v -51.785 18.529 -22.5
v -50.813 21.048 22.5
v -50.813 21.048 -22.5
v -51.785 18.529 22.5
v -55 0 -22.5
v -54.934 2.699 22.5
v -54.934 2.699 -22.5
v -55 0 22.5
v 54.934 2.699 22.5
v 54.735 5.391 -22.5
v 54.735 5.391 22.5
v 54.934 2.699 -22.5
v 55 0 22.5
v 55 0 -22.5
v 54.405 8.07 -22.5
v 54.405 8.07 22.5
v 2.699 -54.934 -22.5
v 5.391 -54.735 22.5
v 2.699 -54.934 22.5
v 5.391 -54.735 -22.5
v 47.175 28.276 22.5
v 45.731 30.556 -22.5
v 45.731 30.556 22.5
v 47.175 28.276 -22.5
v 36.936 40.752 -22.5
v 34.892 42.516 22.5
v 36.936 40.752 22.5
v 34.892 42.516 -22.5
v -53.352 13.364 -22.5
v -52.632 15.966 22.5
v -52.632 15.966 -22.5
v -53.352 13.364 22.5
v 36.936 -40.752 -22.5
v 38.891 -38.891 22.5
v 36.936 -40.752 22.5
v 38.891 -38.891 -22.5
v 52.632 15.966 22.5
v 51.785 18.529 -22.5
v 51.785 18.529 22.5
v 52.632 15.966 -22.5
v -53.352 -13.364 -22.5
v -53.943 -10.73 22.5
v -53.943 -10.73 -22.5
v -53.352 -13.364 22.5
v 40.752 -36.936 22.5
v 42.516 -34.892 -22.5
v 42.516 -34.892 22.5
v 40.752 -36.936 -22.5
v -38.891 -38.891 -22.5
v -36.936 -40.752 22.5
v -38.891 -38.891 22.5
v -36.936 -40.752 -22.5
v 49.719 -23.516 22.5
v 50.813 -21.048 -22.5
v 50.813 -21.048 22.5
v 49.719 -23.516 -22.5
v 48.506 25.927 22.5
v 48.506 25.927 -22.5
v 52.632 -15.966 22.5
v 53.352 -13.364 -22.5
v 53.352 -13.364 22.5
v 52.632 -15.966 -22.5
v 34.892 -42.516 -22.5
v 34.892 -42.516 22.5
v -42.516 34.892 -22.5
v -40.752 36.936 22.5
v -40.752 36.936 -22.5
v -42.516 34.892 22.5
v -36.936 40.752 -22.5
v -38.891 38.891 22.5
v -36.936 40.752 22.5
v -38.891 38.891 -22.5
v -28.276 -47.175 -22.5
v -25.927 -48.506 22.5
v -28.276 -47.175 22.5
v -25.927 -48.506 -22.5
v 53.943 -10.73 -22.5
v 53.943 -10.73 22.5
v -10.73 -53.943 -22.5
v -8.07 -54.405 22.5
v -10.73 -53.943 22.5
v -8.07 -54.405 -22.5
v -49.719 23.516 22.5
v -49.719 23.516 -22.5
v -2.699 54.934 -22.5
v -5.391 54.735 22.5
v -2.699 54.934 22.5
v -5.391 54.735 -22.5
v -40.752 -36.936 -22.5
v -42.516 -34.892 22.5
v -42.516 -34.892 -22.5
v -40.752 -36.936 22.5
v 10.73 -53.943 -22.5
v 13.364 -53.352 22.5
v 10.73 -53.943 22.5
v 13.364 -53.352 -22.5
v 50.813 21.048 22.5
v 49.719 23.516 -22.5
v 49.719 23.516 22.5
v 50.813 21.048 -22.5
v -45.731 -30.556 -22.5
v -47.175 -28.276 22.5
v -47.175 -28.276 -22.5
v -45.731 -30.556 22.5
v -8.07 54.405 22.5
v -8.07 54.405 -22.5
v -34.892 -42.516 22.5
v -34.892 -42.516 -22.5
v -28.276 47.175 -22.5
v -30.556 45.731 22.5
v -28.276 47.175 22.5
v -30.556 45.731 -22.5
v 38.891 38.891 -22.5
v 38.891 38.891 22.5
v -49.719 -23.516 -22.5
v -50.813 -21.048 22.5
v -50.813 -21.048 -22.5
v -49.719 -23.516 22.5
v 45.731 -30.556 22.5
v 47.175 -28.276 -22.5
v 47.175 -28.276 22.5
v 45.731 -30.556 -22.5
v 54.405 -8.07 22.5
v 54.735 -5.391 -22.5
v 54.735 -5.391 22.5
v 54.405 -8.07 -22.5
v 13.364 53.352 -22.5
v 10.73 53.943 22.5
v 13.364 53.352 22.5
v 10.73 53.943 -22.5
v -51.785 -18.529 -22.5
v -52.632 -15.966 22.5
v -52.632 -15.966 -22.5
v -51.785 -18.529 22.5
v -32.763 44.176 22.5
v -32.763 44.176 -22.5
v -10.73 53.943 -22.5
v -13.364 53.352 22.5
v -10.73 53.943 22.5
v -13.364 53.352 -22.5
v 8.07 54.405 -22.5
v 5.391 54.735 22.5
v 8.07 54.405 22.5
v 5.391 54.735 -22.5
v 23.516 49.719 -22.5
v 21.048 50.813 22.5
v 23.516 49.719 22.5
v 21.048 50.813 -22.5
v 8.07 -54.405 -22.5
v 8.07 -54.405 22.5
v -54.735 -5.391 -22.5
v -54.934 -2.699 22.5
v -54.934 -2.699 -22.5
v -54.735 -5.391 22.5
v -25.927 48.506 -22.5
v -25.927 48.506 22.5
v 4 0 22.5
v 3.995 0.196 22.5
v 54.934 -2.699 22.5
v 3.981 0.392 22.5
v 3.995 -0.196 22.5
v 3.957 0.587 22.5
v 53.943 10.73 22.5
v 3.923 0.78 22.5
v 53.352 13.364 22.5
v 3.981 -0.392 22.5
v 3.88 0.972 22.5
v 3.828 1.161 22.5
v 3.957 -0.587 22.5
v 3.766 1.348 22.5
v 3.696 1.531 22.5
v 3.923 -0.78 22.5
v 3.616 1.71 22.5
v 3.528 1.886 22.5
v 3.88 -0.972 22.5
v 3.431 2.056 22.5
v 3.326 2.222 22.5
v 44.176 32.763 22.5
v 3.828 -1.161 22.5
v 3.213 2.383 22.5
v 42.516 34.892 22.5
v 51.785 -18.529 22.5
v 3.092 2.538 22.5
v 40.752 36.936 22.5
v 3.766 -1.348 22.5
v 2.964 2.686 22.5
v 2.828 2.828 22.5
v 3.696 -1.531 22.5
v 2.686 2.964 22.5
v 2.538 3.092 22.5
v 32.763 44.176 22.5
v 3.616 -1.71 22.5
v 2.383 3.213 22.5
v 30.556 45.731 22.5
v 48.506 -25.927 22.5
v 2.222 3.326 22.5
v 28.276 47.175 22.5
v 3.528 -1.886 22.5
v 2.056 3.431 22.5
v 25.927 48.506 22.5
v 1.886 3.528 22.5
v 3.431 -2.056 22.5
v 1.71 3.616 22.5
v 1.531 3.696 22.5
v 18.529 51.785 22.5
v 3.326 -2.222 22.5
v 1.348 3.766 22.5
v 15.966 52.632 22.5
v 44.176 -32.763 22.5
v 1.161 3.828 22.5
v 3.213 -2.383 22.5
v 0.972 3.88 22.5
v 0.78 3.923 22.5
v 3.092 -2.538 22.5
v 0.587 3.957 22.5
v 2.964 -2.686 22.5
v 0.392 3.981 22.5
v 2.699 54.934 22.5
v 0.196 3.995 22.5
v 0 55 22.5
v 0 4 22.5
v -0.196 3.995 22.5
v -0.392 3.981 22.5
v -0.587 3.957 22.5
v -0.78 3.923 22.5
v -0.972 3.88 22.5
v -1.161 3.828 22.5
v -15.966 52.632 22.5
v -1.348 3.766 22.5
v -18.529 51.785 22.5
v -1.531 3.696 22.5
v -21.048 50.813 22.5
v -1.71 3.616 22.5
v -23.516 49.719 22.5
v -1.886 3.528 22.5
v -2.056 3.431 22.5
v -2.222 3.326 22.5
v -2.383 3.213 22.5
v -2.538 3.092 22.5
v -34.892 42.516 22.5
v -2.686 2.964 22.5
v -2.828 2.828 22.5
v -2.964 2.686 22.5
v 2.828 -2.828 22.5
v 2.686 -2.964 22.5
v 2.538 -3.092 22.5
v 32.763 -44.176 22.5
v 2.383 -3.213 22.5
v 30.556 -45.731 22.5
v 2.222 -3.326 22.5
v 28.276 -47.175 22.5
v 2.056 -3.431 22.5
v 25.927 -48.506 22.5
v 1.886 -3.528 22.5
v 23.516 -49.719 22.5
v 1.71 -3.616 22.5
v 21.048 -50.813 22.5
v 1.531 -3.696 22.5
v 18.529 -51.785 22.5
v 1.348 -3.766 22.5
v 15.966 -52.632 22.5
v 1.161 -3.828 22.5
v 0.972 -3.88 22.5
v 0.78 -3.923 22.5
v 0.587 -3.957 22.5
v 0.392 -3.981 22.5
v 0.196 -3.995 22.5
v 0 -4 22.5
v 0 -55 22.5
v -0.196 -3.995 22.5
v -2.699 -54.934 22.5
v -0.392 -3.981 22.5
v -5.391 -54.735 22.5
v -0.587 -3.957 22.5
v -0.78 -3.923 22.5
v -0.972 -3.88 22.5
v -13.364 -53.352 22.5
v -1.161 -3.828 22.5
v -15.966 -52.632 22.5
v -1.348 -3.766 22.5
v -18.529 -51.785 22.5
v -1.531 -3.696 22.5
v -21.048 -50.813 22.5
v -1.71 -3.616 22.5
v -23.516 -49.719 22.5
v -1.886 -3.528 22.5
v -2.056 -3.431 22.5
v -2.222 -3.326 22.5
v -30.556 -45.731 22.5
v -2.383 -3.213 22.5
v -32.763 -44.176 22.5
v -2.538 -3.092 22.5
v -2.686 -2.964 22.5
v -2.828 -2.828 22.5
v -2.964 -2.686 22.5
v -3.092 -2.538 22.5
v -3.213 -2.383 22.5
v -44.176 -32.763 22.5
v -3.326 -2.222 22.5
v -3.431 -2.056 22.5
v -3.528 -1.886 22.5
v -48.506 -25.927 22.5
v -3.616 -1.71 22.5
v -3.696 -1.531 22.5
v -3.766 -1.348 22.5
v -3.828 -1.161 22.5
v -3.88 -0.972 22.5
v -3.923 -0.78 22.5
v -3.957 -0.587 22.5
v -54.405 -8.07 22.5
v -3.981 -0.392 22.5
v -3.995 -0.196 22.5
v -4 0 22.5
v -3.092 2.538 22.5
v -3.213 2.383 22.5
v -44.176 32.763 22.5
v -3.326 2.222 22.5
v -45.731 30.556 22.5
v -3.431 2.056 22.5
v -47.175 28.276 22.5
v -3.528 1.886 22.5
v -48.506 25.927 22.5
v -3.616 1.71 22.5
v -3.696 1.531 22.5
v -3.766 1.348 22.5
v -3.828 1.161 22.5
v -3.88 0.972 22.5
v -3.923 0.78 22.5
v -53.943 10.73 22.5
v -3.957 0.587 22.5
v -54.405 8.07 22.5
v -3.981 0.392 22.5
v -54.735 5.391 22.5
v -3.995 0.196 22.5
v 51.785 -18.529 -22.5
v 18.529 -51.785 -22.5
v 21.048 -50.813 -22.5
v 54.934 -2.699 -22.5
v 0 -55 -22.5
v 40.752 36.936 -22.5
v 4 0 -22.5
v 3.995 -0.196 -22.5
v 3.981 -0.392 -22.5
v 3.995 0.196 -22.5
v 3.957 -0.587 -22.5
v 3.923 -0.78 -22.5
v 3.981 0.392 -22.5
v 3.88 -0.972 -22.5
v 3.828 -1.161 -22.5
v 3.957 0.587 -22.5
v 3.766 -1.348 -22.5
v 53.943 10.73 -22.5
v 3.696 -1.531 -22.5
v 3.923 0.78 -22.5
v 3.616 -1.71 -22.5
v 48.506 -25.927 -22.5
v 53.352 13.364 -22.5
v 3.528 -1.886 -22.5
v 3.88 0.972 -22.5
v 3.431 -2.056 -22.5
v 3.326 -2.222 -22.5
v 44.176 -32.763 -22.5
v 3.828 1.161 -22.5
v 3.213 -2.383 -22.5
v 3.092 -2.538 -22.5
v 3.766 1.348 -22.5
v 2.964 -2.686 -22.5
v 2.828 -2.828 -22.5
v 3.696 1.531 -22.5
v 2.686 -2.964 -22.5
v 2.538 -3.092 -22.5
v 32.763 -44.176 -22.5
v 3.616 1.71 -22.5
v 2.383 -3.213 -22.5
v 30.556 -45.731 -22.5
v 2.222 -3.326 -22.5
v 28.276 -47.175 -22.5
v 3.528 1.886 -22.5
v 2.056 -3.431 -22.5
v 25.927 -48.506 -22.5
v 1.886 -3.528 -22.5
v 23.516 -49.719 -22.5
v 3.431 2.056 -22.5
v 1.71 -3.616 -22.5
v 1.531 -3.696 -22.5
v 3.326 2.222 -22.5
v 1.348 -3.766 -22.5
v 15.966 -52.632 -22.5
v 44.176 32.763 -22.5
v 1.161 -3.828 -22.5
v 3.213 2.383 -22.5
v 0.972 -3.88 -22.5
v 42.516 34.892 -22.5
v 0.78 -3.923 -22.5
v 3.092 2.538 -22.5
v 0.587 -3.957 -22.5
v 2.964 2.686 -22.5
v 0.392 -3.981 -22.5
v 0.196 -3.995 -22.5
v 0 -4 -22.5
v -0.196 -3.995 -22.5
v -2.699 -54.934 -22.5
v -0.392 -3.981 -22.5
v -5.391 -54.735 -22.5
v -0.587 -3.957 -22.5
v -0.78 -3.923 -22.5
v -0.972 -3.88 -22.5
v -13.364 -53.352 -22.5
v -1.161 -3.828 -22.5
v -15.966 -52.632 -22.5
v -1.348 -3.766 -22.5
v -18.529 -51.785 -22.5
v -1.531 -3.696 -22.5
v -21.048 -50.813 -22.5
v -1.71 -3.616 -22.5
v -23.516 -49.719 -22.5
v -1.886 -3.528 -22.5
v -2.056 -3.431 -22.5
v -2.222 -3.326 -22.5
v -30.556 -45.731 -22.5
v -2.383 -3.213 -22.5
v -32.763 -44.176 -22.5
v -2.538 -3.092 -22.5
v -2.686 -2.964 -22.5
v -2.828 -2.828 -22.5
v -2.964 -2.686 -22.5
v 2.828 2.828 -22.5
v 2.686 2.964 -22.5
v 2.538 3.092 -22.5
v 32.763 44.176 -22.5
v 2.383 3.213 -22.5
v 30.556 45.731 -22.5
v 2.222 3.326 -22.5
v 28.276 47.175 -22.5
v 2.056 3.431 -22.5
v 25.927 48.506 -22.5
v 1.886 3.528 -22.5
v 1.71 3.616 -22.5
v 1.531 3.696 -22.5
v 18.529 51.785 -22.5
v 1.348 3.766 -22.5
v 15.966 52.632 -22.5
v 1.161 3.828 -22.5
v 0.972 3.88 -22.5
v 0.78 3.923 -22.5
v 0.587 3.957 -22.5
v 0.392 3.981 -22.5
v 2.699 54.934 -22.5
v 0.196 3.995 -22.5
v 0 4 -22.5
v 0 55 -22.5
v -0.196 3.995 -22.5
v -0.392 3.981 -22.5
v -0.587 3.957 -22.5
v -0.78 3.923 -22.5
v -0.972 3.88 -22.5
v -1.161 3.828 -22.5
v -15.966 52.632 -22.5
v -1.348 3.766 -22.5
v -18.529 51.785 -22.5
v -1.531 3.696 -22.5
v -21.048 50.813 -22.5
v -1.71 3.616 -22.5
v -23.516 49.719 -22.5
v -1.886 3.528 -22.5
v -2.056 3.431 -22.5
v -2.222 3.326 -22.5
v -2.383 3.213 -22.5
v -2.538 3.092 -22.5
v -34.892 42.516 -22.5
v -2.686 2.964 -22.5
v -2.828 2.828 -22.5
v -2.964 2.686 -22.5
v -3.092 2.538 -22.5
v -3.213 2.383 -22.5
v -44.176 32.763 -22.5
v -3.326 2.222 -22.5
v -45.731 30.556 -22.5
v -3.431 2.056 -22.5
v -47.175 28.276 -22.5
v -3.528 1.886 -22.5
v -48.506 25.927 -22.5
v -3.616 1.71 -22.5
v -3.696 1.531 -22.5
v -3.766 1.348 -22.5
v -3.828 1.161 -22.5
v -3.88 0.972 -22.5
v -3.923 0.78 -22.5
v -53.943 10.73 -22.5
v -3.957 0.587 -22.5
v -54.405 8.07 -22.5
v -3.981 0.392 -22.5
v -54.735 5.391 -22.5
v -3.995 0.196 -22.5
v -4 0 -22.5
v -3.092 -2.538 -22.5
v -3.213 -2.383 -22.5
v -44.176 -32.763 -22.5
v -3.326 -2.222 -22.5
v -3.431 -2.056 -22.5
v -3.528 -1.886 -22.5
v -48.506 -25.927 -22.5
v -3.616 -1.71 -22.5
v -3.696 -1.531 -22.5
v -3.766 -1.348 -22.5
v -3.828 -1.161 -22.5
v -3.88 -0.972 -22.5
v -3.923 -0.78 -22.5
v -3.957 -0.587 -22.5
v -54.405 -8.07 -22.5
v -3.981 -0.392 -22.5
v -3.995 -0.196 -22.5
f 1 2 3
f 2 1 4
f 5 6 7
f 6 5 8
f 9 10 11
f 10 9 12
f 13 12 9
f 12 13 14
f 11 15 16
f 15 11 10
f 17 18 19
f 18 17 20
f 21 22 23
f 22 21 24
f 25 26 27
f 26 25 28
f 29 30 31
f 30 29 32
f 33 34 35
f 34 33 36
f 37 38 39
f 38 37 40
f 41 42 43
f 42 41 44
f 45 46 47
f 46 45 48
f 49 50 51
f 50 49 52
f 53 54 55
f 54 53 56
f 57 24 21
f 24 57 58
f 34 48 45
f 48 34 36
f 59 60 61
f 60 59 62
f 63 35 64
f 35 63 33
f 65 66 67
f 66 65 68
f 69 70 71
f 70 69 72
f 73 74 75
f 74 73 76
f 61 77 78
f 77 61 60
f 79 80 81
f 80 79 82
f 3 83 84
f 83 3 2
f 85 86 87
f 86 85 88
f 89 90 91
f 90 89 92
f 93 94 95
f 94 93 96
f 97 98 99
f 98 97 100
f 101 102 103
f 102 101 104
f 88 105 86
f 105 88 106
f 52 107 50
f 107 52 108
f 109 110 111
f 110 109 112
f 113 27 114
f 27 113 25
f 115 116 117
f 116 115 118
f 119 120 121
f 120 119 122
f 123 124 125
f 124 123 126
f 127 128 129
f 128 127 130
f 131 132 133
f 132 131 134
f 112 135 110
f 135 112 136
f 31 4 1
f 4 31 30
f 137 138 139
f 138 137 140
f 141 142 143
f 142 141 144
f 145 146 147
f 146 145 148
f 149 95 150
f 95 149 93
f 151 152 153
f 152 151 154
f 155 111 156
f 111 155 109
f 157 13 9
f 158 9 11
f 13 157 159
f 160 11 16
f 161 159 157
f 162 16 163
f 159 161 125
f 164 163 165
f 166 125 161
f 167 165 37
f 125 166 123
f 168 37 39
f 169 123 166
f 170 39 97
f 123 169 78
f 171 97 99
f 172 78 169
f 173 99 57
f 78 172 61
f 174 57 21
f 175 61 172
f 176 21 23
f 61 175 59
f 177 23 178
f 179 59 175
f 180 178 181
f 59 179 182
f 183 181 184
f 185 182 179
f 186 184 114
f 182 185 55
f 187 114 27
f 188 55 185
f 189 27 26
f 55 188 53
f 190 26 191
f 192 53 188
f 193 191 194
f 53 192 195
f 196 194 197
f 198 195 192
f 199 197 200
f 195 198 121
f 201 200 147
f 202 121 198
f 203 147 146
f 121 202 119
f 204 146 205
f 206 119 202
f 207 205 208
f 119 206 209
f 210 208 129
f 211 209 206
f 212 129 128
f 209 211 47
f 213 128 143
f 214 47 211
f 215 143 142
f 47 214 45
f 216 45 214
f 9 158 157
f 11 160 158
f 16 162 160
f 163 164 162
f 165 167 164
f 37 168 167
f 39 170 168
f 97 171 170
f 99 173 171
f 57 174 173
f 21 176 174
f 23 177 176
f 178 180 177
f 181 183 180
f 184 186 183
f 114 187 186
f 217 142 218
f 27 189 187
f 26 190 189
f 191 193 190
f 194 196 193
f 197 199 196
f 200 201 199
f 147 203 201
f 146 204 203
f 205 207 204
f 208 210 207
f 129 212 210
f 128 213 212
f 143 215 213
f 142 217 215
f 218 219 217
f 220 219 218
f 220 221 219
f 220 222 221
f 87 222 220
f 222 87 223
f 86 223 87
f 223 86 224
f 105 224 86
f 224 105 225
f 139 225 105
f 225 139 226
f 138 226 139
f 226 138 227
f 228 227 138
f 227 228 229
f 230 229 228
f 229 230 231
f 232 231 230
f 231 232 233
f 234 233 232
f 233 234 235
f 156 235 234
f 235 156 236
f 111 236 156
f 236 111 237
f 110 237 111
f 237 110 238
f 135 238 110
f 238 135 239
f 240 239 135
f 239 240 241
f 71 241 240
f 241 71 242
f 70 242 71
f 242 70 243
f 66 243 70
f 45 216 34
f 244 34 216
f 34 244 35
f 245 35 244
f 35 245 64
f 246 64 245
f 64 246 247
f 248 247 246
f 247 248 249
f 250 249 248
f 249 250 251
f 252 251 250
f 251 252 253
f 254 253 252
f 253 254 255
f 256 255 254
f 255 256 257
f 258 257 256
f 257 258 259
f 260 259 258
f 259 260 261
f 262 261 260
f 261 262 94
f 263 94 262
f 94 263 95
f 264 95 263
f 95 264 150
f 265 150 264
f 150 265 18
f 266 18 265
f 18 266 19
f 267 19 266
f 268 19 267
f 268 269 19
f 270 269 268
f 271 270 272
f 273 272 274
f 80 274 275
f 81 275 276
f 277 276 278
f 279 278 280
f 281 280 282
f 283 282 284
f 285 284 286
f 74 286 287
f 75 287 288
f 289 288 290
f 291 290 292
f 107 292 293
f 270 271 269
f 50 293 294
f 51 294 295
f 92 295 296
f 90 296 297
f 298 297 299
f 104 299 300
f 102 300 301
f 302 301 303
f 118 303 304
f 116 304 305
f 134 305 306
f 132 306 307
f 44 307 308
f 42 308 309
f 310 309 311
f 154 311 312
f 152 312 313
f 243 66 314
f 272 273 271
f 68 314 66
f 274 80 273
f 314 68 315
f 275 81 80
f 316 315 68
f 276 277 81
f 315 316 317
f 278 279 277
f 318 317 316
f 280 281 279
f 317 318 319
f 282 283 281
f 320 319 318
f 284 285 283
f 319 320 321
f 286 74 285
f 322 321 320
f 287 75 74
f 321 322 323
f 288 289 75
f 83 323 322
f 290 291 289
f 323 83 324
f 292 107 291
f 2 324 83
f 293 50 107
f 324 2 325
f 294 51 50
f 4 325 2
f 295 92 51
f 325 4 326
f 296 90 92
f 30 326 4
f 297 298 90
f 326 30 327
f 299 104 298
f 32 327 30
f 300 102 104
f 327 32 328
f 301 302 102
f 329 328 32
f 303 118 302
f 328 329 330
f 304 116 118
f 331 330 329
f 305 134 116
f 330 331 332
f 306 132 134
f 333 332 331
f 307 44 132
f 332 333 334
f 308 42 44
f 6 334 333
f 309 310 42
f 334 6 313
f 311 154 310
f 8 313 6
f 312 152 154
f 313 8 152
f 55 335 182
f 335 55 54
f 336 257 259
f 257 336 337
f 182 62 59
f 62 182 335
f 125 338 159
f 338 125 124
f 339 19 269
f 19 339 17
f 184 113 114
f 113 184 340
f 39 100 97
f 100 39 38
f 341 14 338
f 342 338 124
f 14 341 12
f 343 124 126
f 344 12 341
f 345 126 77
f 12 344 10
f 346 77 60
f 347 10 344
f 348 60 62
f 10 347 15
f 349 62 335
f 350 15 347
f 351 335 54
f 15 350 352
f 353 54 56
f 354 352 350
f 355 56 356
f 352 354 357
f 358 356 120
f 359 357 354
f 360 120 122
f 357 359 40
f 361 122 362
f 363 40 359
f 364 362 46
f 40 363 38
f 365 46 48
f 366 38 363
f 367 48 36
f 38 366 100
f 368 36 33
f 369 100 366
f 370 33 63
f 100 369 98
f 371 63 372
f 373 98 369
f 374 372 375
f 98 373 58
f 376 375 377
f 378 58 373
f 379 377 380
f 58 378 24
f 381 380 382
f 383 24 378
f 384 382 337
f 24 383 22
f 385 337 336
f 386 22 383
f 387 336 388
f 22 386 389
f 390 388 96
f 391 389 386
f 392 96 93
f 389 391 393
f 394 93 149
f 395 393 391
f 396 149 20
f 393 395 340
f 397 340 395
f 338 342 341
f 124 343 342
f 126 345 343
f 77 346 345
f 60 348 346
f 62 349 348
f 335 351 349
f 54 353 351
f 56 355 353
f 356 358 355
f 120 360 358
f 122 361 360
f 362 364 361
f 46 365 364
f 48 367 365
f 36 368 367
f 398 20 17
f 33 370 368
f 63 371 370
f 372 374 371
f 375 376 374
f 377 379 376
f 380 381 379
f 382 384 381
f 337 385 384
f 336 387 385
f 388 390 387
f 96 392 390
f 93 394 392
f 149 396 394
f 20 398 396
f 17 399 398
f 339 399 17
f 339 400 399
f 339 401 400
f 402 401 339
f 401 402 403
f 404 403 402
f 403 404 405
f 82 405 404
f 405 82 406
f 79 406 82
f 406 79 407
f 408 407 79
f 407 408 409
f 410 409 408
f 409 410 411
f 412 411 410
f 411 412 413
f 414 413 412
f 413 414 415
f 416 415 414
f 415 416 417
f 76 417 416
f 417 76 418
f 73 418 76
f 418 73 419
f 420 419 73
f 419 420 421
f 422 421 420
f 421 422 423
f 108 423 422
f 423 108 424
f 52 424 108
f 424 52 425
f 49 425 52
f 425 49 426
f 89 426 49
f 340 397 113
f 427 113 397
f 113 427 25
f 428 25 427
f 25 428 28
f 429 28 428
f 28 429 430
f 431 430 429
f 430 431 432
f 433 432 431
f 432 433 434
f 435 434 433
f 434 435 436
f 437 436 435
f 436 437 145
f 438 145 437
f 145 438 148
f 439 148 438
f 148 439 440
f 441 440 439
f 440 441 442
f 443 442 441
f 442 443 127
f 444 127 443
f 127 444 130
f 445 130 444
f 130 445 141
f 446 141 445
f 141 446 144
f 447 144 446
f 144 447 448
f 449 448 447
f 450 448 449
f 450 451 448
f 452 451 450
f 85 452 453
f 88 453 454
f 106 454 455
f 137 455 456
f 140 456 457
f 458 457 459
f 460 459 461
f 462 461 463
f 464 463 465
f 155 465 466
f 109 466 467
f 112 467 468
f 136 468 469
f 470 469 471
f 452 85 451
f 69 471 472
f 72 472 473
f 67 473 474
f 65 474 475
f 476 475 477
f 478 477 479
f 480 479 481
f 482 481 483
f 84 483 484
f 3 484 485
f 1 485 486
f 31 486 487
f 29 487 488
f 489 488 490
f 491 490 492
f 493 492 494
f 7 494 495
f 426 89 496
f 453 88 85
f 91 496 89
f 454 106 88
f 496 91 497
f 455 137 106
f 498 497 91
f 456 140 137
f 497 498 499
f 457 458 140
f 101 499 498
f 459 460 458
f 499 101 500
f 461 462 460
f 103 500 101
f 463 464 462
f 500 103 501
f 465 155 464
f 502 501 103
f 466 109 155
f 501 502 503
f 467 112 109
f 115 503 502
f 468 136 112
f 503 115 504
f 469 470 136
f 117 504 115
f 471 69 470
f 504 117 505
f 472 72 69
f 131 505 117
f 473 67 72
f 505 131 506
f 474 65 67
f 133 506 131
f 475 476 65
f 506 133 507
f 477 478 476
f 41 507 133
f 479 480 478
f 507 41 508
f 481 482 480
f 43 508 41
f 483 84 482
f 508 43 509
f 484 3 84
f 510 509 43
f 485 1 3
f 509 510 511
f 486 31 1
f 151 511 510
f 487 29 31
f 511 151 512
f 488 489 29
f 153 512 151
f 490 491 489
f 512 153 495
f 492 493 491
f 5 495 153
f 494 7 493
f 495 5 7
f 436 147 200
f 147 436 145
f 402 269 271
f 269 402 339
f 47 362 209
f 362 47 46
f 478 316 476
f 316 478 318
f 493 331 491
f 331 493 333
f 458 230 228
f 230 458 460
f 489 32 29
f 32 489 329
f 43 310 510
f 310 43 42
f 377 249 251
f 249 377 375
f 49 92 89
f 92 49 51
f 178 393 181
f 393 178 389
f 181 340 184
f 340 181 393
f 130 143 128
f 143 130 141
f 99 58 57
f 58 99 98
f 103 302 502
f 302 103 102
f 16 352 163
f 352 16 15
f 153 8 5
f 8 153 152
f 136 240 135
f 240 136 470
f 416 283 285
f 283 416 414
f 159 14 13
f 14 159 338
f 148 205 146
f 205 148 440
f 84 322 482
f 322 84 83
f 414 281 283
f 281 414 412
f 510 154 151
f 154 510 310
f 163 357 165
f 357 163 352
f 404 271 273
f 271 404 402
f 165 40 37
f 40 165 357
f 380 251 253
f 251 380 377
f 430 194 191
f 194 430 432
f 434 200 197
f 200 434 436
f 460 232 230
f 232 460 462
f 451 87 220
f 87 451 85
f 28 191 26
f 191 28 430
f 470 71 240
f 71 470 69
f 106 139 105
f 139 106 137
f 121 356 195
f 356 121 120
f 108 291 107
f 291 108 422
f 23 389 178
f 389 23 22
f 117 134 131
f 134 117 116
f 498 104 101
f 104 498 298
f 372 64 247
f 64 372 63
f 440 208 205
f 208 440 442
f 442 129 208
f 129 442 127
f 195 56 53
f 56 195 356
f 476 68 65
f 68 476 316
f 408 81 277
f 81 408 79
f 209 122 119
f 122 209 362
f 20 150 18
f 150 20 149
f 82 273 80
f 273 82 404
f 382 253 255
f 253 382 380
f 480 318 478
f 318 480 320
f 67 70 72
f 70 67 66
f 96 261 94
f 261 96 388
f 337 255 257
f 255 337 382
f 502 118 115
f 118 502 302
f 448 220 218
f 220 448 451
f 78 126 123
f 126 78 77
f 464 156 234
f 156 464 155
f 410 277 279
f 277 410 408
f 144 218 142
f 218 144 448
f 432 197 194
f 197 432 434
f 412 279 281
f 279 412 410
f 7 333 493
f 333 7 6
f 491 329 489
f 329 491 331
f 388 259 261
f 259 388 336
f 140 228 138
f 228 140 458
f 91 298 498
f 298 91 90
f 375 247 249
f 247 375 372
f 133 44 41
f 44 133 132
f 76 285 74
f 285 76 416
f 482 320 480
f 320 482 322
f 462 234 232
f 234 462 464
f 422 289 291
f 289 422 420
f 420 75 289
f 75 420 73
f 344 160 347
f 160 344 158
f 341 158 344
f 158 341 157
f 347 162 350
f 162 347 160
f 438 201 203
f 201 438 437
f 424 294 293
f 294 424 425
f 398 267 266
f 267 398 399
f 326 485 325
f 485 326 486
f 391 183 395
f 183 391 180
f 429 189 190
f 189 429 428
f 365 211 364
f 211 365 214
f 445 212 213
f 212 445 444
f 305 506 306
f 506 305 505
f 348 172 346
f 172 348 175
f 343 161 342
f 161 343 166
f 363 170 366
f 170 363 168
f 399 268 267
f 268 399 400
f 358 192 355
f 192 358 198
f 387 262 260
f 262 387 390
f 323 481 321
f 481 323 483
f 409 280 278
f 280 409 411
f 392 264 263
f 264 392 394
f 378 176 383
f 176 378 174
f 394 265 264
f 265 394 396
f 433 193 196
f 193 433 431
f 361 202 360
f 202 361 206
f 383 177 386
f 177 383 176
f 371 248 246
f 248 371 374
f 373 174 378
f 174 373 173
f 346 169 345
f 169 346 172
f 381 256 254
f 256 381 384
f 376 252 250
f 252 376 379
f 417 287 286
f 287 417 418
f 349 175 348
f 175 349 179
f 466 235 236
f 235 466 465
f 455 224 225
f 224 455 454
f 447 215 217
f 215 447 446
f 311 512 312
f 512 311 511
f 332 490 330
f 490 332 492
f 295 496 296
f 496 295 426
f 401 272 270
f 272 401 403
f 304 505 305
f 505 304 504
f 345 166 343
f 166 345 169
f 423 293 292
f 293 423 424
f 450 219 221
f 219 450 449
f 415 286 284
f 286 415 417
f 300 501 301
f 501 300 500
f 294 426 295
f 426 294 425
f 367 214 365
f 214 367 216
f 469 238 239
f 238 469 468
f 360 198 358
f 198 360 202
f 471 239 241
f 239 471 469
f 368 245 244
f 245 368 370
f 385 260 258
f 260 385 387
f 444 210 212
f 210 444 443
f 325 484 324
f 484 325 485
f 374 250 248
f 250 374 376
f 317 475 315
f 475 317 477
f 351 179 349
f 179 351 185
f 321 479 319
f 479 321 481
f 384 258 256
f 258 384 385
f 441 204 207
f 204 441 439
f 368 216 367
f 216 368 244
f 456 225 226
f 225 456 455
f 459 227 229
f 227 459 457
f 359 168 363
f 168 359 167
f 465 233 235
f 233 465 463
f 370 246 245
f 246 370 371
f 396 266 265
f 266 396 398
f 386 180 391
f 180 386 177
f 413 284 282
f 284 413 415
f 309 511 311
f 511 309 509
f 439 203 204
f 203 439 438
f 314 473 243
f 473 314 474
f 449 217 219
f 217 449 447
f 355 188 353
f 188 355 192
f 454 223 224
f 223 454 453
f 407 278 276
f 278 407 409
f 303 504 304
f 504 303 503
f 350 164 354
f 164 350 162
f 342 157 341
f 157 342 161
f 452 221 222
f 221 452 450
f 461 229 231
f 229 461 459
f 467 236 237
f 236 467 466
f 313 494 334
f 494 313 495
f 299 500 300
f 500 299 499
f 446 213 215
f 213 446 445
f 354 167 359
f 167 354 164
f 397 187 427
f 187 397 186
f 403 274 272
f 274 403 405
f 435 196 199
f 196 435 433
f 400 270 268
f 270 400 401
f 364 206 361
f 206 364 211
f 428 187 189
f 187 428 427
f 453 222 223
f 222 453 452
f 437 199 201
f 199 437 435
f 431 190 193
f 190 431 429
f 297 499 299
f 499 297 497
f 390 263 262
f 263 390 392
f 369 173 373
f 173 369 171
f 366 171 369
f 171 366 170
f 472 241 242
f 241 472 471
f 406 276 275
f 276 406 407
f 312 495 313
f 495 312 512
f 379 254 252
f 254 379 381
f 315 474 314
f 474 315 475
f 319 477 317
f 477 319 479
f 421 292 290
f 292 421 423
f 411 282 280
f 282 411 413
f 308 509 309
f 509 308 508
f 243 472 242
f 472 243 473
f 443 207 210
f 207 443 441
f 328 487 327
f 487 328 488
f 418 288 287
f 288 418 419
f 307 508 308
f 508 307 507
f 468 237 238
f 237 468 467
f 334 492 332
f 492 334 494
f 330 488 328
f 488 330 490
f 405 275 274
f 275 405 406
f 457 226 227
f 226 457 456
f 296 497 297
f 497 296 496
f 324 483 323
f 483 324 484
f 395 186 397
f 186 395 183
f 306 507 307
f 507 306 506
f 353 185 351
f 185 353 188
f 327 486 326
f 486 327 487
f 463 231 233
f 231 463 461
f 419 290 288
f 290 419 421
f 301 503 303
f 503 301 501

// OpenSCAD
// Friction wheel placeholder v1
// Units: mm
// Supports 110mm / 130mm variants for P0-A/P0-B layout.

$fn = 128;
wheel_d = 110;       // set to 130 for P0-B candidate
wheel_w = 45;
bore_d = 8;
hub_d = 36;
hub_w = 18;

module friction_wheel(d=wheel_d, w=wheel_w) {
  difference() {
    union() {
      color("#111827") cylinder(h=w, d=d, center=true);
      color("#475569") cylinder(h=hub_w, d=hub_d, center=true);
    }
    cylinder(h=w+2, d=bore_d, center=true);
  }
}

friction_wheel();
